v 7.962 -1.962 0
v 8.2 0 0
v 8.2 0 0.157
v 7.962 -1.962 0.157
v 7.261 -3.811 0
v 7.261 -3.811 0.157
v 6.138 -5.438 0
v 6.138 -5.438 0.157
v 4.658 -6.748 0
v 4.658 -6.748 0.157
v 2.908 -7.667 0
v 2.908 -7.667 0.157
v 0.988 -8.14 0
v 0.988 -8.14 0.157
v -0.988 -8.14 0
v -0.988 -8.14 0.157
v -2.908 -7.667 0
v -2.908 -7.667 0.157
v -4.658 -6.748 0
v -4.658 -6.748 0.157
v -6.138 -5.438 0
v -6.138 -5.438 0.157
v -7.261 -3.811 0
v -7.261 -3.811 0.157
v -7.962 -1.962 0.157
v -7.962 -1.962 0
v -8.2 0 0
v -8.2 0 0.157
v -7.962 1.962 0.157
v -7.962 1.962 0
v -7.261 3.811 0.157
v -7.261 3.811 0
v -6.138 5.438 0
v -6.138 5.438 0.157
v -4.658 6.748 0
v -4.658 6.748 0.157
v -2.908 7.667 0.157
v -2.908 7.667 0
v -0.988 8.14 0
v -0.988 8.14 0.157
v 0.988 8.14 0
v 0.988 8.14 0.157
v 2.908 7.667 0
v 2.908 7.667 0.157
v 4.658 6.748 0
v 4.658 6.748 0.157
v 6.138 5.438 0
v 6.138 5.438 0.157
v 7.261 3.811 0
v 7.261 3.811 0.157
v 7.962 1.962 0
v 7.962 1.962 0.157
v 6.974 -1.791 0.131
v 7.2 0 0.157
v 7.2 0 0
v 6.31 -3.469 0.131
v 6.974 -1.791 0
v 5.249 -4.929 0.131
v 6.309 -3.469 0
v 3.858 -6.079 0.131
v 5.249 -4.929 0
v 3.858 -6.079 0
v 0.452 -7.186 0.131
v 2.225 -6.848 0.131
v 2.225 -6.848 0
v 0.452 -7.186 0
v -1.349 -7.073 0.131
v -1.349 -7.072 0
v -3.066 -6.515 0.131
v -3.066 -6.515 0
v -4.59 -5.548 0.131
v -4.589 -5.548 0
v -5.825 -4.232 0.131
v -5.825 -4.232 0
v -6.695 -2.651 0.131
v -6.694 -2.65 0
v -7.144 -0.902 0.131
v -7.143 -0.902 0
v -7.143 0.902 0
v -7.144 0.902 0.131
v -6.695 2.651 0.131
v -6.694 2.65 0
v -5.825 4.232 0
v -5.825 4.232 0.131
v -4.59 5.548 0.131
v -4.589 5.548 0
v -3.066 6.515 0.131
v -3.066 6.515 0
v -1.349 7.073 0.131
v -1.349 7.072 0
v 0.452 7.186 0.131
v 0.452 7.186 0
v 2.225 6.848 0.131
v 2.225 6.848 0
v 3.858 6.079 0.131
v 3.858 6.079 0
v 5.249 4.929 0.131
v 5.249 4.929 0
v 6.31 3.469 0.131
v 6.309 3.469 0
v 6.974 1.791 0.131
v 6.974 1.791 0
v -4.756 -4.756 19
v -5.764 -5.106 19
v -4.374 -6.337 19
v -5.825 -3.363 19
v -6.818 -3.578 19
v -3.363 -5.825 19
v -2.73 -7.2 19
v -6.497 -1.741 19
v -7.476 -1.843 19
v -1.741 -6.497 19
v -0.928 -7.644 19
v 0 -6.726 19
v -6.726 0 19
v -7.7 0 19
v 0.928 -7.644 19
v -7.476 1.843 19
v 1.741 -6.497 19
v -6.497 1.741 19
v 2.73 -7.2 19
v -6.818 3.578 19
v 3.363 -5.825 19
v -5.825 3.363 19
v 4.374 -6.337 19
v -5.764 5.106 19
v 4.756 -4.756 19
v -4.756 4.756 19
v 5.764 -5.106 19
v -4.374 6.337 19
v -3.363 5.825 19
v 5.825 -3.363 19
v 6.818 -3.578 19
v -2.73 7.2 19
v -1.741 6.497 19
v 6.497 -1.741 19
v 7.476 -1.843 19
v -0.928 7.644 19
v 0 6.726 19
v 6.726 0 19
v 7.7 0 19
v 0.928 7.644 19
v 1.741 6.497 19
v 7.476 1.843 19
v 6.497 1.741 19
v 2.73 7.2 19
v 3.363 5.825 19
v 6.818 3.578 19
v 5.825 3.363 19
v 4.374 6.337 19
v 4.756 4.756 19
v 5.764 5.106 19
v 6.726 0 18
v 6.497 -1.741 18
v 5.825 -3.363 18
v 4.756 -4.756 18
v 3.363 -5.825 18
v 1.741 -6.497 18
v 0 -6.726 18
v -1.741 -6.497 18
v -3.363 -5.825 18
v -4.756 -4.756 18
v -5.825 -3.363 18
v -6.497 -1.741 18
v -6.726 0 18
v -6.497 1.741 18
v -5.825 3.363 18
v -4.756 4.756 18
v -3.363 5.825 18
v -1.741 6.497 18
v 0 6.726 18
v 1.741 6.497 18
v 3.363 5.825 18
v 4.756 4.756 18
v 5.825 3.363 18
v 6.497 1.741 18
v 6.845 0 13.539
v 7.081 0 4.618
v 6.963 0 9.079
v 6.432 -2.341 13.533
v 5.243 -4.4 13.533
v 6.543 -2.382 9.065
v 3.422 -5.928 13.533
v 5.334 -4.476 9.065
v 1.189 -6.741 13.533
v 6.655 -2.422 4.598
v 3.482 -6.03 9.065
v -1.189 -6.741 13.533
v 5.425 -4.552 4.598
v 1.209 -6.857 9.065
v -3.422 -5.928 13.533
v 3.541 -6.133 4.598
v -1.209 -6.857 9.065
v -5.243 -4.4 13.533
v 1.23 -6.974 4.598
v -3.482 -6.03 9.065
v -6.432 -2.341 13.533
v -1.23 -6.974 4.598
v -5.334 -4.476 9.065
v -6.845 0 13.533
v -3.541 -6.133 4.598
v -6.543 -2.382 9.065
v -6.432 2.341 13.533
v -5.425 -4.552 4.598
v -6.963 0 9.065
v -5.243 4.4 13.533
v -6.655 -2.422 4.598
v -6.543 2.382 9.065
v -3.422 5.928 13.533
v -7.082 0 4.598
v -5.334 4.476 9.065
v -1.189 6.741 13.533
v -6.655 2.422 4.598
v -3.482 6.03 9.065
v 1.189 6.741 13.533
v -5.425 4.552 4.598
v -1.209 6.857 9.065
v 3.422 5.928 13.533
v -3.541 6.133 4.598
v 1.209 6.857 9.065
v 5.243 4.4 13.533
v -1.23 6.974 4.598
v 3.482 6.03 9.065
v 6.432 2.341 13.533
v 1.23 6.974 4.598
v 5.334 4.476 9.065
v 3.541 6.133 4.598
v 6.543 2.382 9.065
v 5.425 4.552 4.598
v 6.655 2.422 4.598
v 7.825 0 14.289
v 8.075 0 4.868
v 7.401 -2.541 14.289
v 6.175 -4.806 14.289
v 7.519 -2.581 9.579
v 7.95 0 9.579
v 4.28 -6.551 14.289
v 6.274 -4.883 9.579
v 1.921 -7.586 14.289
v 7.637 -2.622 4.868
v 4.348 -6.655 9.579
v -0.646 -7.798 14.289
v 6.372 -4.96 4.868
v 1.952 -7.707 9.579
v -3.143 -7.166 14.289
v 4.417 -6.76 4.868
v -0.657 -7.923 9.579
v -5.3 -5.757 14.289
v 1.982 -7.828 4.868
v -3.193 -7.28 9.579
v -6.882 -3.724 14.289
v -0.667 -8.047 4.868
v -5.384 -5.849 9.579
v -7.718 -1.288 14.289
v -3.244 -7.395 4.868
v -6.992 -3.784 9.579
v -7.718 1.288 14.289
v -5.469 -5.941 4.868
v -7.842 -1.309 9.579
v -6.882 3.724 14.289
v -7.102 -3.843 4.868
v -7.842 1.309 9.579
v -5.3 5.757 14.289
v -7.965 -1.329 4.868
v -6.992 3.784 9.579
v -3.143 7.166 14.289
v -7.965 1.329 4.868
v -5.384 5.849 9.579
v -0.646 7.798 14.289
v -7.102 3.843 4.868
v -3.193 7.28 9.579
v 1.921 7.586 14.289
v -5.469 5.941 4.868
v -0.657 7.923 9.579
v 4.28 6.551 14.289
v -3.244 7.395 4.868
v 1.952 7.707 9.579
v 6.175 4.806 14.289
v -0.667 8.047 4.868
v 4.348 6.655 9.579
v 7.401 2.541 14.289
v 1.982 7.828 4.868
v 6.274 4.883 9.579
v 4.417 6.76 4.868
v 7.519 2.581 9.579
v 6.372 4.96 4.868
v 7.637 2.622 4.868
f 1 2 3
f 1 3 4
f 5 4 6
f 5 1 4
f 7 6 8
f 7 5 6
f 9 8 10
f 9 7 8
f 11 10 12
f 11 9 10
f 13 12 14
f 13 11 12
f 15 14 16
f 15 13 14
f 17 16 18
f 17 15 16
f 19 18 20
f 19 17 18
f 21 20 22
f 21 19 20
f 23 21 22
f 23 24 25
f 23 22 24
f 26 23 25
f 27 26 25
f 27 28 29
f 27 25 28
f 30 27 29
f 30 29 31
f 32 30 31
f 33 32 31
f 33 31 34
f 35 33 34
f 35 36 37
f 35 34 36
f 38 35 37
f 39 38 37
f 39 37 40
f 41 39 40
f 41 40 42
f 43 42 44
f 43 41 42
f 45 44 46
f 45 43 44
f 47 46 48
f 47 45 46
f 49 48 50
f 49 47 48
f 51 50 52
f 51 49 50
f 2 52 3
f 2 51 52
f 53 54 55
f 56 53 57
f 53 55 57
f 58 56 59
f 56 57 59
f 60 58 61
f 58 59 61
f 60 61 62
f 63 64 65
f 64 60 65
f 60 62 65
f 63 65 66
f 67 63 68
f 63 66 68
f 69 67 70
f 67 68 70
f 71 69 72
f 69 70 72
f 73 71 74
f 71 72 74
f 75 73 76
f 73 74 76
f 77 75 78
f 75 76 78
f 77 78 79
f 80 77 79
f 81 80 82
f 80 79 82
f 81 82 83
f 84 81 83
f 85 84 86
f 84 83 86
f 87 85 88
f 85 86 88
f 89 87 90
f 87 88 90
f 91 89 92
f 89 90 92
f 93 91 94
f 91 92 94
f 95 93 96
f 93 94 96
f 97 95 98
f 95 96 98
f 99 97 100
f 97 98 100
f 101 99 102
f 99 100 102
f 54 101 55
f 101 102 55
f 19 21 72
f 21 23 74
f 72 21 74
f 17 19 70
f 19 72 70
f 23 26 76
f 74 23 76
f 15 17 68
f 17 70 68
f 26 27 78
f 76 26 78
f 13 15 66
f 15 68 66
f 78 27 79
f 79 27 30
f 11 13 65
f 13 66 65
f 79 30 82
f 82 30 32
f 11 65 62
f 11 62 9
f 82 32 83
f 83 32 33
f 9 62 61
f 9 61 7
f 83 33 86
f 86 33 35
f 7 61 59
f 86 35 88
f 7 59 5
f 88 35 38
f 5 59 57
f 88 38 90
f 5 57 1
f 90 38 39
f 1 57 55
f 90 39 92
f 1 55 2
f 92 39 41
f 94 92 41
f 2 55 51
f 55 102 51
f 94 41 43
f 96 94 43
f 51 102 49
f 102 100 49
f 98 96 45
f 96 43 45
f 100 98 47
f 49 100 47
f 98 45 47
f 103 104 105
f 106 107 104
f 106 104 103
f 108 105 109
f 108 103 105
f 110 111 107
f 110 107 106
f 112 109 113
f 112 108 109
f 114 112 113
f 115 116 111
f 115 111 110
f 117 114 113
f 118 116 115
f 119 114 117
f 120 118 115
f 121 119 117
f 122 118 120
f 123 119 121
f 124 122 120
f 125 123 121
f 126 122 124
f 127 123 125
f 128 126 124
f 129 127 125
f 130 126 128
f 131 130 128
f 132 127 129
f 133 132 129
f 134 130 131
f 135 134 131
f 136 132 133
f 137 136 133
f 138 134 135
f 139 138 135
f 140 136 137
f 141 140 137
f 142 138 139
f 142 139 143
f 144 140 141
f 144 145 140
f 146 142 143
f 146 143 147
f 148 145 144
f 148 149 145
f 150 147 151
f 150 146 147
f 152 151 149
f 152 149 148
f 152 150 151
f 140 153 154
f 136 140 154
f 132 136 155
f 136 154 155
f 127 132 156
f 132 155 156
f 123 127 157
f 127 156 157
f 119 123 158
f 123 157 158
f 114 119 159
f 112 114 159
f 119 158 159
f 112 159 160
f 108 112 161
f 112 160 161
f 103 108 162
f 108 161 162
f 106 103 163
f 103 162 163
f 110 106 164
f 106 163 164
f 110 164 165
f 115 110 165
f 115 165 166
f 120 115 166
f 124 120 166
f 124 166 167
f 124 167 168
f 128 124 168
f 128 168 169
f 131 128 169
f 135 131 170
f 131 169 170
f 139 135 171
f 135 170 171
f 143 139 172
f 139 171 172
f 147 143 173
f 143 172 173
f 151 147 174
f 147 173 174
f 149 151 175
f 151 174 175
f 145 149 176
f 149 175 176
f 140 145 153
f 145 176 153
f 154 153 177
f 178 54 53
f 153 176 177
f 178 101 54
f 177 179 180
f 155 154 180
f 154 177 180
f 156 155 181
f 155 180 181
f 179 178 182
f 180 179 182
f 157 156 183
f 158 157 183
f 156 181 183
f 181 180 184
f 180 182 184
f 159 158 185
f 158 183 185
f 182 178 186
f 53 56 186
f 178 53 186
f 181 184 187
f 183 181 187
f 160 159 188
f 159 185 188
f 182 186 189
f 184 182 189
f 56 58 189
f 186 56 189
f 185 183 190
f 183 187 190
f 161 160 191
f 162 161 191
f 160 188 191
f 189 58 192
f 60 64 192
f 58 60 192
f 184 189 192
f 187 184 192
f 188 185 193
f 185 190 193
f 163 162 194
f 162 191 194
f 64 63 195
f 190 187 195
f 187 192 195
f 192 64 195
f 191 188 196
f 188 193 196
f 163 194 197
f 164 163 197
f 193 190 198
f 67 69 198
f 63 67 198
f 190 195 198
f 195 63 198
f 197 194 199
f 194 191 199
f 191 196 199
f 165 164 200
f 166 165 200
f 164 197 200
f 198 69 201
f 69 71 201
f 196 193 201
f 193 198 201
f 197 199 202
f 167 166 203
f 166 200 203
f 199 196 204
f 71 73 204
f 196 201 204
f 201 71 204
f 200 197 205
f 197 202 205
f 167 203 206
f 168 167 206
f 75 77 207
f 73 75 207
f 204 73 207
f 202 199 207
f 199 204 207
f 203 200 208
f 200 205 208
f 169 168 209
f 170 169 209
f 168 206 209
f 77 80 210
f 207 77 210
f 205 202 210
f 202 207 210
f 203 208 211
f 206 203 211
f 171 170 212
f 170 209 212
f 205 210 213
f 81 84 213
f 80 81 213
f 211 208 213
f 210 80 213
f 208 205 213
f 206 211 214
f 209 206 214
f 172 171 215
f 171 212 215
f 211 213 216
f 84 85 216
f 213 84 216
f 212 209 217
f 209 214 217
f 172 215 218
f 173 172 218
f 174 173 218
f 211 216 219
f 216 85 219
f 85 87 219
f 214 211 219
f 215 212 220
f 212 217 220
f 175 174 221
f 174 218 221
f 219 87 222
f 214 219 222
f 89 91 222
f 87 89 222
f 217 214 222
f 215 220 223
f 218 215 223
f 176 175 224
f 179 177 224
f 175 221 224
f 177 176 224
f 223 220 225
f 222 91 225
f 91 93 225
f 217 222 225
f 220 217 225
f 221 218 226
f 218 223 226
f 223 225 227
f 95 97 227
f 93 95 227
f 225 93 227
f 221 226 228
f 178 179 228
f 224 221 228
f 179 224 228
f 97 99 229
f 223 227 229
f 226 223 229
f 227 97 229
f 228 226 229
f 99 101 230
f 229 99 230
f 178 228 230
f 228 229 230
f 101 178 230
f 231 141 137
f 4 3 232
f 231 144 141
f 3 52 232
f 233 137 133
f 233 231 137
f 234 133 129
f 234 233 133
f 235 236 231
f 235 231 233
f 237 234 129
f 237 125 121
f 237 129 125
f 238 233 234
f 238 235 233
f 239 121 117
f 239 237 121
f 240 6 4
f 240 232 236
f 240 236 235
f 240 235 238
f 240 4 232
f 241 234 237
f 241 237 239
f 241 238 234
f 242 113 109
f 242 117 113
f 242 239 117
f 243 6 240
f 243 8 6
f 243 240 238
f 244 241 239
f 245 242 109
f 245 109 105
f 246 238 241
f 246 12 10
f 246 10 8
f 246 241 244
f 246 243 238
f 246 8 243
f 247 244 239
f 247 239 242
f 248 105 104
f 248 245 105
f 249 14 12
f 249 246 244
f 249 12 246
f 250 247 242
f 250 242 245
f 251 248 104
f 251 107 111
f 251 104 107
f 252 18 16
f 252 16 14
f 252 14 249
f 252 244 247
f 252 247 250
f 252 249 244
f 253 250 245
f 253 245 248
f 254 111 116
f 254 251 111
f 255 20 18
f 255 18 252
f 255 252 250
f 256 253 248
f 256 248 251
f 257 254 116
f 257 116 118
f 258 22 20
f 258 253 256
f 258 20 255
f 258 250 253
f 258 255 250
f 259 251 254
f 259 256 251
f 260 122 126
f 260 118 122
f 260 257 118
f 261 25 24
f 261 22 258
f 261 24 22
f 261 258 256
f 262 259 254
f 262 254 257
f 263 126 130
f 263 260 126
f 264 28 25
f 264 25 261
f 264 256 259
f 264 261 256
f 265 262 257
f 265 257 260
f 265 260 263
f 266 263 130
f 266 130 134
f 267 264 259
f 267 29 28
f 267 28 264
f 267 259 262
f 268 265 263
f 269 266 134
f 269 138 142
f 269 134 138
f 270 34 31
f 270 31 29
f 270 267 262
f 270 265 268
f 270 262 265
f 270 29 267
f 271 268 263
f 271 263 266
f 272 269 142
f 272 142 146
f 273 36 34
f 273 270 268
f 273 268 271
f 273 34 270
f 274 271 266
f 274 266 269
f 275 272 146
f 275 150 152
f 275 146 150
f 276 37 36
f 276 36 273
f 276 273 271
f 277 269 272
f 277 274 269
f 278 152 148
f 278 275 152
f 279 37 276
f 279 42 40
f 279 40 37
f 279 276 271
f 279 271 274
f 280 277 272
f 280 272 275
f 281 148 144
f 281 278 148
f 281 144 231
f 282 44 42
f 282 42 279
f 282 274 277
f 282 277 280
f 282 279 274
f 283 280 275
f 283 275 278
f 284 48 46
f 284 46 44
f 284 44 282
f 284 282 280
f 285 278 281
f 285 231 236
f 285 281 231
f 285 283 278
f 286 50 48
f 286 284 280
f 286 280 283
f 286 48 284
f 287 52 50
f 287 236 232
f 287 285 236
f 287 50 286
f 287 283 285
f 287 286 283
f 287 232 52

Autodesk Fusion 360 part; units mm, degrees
sketch "Sketch1" plane through (0, 0, 0) normal (0, 0, 1) x (1, 0, 0)
  circle A0 centre (0, 0) radius 8.2
  dimension "d1" = 16.4
extrude "Extrude1" add sketch "Sketch1" along normal blind 19
chamfer "Chamfer1" distance 0.5 angle 88.48 1 edges at (-7.6451, -2.9652, 19) measured on face at (1.6133, 1.7387, 19)
shell "Shell1" thickness 1 removed faces 1 at (1.6133, 1.7387, 0)
extrude "Extrude2" cut 1 faces at (-3.862, -0.2442, 18) along direction (0, 0, 1) blind 1
